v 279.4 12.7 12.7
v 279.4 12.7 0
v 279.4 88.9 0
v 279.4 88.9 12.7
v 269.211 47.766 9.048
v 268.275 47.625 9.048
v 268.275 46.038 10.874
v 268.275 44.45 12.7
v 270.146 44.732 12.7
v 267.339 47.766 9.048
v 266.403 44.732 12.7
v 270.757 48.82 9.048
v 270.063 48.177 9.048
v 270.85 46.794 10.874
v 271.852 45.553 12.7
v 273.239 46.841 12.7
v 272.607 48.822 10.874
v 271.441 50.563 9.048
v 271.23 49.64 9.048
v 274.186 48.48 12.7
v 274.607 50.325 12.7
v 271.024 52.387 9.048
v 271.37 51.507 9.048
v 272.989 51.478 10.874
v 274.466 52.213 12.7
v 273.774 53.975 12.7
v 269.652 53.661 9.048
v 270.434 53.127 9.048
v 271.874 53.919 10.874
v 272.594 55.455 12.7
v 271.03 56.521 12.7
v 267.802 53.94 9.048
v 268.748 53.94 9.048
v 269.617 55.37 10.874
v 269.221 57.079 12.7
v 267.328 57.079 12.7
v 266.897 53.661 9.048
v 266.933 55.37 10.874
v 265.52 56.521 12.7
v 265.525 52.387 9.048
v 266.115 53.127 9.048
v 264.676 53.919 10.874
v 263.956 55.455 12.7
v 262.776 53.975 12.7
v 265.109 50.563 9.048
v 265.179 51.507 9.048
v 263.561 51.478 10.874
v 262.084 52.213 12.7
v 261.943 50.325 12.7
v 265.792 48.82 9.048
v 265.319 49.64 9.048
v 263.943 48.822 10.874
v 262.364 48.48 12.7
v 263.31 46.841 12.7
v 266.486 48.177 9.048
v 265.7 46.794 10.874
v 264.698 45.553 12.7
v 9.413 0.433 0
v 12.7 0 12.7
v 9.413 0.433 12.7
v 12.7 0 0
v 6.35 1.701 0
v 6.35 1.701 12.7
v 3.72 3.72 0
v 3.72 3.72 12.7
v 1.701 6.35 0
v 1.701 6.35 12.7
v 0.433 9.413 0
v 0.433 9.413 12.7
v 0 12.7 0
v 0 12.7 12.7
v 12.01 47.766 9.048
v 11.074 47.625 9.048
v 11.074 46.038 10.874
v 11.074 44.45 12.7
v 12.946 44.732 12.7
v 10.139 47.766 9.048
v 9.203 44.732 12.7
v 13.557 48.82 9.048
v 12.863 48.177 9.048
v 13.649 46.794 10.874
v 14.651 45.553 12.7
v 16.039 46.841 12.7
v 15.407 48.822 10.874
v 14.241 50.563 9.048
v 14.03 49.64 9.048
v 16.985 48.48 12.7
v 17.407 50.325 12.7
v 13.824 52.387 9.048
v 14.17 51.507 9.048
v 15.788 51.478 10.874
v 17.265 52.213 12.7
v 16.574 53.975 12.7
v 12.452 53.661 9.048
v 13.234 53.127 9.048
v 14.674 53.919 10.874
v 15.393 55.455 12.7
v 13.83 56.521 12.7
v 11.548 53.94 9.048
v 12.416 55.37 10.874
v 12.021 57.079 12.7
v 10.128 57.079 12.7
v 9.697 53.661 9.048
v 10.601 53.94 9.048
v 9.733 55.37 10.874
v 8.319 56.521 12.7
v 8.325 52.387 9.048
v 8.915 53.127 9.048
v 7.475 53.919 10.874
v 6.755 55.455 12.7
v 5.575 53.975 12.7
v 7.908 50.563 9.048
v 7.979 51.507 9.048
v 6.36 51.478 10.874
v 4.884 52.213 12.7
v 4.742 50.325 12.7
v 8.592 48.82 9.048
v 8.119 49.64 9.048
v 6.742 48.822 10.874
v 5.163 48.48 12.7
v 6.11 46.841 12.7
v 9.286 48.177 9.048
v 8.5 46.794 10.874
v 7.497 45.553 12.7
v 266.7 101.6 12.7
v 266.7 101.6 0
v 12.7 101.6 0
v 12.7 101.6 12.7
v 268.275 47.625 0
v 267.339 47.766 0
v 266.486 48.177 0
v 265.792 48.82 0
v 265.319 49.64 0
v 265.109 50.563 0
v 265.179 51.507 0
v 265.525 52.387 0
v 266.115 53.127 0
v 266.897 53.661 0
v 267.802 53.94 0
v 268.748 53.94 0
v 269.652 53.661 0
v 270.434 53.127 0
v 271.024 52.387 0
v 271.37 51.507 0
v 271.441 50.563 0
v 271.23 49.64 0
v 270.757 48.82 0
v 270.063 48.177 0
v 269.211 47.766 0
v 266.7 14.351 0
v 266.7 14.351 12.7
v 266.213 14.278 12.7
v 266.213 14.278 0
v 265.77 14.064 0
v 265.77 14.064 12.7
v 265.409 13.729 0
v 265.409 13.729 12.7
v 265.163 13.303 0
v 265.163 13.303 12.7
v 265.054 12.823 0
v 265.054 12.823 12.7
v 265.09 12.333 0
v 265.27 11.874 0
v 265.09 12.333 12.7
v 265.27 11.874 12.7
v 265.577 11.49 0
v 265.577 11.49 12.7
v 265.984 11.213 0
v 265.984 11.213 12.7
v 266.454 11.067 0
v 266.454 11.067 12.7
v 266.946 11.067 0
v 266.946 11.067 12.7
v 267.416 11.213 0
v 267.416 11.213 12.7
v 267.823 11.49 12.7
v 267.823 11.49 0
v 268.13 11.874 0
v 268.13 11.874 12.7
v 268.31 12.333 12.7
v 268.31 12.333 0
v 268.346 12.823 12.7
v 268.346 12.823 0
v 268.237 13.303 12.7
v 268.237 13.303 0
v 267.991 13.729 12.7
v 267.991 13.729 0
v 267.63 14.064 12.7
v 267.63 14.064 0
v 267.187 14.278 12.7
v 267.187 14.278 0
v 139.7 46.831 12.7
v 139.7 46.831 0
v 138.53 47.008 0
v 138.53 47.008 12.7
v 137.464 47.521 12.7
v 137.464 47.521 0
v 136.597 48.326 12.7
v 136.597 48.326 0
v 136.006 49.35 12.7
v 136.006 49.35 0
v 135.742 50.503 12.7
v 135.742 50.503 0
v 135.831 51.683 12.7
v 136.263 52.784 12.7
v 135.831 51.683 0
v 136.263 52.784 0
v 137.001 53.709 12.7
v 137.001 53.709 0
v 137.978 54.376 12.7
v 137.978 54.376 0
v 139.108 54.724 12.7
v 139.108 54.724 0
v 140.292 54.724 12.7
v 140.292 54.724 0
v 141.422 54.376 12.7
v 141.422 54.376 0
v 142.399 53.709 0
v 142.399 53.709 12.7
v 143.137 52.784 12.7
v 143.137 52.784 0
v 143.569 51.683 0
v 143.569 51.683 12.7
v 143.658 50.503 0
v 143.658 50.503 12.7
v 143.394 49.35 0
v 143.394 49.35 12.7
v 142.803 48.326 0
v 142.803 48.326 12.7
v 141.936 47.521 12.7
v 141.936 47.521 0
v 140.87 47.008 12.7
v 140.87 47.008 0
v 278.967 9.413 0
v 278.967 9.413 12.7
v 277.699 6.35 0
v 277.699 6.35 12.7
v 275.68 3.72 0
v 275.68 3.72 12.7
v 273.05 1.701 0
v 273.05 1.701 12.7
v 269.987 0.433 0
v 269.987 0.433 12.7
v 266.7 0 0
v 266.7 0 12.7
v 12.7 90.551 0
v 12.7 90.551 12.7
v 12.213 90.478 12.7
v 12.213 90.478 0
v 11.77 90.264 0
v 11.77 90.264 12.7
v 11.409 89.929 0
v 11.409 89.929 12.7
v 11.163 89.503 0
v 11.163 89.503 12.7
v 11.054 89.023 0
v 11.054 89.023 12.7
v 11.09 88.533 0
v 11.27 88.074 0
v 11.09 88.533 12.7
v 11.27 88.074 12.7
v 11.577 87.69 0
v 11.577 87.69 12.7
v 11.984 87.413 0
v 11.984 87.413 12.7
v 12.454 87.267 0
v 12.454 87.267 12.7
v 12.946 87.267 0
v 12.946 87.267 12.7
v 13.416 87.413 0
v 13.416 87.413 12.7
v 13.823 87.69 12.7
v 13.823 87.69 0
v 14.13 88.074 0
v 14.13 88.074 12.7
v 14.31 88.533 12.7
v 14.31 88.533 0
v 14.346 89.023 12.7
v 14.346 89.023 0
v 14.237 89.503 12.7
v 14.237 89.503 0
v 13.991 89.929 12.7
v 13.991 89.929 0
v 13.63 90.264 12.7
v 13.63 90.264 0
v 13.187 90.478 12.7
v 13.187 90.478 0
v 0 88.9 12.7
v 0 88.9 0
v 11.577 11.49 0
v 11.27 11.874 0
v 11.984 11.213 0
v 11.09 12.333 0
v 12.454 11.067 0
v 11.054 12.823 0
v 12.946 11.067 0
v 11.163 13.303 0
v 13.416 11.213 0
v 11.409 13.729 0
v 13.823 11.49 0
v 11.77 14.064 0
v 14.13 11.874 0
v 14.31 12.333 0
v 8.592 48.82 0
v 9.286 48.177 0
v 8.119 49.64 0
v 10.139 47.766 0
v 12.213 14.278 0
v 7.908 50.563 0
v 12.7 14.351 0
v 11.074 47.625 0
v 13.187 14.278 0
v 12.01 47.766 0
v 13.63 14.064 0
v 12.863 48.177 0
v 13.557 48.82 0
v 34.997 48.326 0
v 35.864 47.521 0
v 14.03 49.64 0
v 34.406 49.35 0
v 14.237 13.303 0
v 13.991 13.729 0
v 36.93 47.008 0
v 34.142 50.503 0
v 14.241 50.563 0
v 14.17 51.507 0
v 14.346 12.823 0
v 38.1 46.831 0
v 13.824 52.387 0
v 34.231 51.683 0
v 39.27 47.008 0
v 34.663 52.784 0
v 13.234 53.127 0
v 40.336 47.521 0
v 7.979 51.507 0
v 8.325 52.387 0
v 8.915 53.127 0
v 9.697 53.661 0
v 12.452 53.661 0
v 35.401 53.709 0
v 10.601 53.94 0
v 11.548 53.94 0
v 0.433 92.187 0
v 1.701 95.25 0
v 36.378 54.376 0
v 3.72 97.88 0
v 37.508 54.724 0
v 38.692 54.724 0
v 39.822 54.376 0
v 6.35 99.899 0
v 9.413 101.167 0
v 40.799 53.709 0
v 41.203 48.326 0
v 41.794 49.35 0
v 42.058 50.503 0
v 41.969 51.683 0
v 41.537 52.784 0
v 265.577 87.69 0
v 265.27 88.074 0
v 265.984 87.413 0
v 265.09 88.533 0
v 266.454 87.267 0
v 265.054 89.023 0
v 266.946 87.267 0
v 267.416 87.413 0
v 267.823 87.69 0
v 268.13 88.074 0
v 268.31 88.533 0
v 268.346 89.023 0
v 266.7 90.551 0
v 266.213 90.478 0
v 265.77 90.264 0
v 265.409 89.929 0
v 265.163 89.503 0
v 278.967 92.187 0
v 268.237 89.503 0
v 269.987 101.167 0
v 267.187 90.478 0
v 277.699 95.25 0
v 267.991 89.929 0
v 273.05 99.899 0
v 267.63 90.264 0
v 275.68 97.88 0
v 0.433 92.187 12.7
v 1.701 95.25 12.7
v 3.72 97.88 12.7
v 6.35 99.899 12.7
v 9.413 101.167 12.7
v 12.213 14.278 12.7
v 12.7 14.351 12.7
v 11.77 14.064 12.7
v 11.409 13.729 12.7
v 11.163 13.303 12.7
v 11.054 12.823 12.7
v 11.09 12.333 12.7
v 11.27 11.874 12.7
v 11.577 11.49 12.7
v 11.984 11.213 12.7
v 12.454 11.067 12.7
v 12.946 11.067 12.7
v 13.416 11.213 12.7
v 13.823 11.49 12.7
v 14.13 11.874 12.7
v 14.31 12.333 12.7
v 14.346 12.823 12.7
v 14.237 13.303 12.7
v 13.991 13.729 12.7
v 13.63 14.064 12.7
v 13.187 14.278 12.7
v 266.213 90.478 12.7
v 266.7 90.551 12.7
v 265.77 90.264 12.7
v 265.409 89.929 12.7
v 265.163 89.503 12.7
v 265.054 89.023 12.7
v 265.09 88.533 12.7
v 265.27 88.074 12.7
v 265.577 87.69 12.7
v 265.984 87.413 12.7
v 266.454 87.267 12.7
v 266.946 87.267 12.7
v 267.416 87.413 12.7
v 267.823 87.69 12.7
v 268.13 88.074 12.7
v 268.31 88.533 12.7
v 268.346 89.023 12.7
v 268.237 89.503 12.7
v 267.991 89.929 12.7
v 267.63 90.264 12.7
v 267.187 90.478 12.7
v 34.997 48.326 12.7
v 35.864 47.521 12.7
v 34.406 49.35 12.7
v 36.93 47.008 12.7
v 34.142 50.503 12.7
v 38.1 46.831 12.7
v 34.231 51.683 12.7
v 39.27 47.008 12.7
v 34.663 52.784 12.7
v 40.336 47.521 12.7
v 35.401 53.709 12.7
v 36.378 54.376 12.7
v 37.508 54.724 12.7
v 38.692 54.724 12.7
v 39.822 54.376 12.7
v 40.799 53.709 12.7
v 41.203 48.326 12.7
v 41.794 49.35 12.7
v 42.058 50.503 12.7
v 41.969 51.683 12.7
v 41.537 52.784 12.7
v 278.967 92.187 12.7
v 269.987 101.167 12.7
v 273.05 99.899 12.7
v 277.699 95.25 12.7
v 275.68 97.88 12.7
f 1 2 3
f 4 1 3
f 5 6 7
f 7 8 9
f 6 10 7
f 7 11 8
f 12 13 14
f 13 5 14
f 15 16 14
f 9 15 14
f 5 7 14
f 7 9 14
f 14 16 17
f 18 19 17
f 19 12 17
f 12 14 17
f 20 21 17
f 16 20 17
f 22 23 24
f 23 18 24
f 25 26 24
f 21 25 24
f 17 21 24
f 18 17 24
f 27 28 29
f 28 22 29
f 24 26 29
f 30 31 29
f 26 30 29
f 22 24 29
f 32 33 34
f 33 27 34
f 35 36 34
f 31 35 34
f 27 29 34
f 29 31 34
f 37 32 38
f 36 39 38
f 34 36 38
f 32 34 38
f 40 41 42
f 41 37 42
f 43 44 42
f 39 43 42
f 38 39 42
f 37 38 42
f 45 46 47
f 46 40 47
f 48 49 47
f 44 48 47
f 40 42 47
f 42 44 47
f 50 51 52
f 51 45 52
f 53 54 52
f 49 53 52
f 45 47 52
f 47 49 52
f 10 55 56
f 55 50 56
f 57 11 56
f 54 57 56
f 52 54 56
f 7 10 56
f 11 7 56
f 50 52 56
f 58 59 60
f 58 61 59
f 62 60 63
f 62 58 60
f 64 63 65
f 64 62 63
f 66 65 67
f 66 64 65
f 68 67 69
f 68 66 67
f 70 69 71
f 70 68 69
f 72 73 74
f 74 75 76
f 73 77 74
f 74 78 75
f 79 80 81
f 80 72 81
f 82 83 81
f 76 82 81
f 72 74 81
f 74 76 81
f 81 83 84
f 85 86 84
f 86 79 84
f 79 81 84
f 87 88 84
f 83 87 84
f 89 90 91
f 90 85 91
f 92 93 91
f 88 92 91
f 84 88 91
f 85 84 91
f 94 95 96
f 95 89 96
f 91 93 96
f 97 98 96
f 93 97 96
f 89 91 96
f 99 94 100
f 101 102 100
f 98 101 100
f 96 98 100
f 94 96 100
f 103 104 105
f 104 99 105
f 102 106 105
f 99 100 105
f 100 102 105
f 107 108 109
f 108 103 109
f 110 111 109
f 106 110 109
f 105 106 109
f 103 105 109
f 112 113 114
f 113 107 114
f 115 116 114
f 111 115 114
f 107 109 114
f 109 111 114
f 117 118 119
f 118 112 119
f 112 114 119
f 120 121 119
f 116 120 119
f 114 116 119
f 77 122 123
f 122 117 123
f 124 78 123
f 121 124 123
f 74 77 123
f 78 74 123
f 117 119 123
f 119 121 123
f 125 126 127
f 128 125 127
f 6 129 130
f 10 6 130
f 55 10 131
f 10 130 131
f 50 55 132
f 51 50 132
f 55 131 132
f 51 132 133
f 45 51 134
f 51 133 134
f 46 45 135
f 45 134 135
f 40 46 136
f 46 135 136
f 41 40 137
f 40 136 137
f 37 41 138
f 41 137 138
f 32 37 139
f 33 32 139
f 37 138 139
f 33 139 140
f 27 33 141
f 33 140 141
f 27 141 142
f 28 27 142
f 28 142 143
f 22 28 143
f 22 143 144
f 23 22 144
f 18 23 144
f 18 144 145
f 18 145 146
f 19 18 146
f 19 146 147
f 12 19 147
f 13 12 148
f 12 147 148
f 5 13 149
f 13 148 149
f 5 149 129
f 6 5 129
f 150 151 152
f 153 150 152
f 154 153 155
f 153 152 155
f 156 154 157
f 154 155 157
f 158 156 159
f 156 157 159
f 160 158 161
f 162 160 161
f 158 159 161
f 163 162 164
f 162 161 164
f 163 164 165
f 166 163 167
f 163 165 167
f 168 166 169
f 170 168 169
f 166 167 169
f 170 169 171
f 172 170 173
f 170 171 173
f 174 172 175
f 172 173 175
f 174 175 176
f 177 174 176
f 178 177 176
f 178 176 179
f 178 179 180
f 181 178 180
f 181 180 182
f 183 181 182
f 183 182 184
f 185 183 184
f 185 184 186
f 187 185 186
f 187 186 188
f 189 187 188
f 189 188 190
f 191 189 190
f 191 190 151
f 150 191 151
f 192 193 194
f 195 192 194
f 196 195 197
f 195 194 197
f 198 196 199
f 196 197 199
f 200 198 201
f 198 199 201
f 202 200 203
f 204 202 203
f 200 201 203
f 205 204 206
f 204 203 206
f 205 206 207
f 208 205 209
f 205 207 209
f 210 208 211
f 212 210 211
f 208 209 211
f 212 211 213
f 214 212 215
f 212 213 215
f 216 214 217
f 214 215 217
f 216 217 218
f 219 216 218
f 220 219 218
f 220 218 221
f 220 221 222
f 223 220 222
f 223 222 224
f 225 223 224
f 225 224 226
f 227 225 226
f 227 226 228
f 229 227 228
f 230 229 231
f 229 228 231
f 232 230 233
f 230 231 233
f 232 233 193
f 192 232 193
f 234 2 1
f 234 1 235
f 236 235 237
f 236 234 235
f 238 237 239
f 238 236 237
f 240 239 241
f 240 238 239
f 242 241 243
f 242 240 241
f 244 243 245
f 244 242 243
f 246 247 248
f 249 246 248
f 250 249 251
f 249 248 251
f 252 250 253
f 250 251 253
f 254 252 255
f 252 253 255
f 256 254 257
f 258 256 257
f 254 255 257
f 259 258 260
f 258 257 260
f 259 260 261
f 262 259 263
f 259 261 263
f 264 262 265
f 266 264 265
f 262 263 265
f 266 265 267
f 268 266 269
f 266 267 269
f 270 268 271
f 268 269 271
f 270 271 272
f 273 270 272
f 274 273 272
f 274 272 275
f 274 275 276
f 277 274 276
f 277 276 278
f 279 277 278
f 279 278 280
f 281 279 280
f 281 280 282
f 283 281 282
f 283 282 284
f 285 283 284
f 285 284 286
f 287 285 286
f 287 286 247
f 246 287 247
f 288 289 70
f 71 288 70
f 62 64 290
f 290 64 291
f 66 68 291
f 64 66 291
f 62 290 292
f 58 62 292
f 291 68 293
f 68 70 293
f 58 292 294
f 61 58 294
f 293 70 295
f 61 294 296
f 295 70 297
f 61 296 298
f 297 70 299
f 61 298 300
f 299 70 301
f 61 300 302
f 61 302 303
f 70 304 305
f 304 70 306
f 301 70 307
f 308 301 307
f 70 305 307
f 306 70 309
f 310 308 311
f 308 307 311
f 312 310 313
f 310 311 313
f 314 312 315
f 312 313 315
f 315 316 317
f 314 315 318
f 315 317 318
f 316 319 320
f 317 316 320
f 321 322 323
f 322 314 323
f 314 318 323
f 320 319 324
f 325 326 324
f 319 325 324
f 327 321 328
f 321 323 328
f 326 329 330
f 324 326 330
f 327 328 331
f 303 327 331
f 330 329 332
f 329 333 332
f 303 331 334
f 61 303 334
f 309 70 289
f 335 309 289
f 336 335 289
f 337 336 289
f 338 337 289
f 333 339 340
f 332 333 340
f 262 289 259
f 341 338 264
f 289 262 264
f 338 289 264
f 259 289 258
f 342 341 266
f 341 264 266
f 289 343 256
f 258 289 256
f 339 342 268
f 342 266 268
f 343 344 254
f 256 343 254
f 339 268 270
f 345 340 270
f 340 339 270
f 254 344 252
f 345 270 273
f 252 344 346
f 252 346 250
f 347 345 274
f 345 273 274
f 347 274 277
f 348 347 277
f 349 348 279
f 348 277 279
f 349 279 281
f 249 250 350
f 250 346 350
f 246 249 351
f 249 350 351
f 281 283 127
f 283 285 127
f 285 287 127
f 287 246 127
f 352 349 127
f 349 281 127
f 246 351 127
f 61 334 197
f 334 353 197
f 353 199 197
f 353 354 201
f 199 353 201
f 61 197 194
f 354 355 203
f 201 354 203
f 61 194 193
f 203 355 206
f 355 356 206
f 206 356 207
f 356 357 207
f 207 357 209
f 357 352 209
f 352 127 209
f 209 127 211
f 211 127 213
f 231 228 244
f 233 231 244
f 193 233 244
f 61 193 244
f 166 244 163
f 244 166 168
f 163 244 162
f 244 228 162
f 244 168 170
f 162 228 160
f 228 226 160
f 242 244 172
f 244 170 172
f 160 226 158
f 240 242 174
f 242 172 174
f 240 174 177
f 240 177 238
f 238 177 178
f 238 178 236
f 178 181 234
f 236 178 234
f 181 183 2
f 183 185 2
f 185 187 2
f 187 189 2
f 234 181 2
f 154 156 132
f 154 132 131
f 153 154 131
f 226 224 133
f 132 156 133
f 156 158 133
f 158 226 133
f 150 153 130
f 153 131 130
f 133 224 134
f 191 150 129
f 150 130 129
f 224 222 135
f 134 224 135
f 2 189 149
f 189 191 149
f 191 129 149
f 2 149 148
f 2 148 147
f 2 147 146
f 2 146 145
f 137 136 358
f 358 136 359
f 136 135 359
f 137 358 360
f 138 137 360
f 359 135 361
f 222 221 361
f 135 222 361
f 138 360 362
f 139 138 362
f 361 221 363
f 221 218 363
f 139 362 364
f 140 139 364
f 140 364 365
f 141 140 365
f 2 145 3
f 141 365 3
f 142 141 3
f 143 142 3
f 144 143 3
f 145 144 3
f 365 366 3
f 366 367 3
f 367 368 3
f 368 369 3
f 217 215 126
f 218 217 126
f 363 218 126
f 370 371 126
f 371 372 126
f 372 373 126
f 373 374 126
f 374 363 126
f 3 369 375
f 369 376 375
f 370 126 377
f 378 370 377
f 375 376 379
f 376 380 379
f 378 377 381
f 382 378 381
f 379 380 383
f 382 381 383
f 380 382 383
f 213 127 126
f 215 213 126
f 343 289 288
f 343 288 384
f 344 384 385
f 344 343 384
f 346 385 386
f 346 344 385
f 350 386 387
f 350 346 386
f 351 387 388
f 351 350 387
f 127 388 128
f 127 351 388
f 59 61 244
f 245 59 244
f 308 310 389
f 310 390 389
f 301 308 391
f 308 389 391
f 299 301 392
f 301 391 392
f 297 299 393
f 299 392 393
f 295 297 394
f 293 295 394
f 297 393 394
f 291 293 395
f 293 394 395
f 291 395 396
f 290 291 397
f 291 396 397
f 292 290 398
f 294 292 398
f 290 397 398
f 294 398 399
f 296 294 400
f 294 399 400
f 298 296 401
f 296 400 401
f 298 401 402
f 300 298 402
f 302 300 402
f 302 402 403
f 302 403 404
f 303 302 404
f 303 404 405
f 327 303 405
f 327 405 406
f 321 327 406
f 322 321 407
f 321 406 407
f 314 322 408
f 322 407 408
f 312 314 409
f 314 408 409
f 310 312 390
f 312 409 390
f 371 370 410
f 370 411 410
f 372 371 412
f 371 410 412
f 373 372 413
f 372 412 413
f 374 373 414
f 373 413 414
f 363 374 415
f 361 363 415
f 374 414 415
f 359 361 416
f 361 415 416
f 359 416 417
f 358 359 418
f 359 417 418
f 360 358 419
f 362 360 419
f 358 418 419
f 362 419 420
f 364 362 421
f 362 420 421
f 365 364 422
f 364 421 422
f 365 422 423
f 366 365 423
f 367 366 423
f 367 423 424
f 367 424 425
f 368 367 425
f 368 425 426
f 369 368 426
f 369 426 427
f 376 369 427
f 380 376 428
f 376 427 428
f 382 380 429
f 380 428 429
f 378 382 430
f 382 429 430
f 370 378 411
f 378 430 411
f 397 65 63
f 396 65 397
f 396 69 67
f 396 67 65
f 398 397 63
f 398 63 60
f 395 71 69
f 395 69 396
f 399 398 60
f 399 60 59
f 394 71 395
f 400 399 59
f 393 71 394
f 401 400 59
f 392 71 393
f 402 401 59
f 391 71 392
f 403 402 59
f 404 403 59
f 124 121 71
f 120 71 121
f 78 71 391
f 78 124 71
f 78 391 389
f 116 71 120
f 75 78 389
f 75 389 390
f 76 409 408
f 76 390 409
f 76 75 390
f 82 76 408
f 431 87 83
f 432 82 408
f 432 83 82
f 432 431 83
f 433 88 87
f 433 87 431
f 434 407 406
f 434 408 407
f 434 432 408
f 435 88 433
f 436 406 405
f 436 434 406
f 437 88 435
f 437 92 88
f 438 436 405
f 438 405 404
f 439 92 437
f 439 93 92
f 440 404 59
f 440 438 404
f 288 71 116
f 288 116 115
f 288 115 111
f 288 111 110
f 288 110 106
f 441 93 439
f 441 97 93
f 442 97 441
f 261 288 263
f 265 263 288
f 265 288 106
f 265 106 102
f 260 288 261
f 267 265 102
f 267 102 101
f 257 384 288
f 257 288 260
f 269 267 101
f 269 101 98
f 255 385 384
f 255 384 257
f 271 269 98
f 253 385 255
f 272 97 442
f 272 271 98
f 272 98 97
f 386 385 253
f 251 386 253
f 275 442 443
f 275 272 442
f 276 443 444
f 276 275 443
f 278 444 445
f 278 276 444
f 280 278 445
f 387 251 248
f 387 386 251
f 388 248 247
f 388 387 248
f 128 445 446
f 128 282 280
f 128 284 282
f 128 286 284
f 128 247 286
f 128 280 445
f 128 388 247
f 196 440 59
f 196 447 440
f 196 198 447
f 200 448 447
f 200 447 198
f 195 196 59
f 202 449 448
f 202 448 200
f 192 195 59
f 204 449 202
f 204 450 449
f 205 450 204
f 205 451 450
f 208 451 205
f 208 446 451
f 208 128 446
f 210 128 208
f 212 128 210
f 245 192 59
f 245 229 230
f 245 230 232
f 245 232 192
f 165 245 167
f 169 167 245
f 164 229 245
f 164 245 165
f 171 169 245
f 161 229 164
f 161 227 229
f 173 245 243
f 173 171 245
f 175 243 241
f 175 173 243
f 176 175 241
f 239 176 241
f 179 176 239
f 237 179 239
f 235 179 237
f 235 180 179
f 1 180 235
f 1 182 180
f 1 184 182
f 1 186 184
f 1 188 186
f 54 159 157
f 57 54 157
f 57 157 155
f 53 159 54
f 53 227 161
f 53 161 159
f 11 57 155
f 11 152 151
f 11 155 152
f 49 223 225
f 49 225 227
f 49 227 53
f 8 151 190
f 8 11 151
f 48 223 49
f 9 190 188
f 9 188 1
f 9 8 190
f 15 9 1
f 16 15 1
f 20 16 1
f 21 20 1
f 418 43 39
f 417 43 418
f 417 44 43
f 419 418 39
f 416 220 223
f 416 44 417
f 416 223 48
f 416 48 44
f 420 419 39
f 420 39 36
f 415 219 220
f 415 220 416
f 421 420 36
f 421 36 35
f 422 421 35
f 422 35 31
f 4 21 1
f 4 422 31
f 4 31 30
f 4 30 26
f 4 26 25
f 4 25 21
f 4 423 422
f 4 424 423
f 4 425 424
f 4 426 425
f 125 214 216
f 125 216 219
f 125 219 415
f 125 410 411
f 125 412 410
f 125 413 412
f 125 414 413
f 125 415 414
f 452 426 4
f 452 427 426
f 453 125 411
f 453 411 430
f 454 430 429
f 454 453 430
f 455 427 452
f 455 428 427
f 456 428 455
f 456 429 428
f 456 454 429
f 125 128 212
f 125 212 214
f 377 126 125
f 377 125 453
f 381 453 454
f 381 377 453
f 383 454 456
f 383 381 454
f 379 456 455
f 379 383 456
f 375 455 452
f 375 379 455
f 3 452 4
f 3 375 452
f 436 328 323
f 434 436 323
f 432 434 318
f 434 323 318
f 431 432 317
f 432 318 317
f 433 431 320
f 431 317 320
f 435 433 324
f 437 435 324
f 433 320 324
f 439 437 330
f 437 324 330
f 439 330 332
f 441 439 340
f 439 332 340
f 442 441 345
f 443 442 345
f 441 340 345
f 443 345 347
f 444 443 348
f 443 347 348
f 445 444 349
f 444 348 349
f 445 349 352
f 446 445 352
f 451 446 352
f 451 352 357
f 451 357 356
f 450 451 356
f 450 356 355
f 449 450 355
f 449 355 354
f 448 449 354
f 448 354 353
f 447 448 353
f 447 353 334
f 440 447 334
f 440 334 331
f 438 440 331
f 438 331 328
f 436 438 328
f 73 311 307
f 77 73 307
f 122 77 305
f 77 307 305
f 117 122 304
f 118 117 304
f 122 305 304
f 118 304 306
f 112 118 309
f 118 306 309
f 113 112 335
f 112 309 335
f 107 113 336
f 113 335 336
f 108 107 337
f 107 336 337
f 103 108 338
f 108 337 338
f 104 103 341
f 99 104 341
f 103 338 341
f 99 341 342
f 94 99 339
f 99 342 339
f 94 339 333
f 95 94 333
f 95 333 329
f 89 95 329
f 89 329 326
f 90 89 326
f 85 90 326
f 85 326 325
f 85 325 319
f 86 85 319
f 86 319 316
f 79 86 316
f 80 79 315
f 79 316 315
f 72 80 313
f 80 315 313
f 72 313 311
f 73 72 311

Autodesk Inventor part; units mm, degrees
ref_plane "YZ Plane" through (0, 0, 0) normal (1, 0, 0) x (0, 1, 0)
ref_plane "XZ Plane" through (0, 0, 0) normal (0, 1, 0) x (-1, 0, 0)
ref_plane "XY Plane" through (0, 0, 0) normal (0, 0, 1) x (1, 0, 0)
sketch "Sketch1" plane through (0, 0, 0) normal (0, 0, 1) x (1, 0, 0)
  line L0 (12.7, 0) -> (266.7, 0)
  line L1 (279.4, 12.7) -> (279.4, 88.9)
  line L2 (266.7, 101.6) -> (12.7, 101.6)
  line L3 (0, 88.9) -> (0, 12.7)
  arc A0 (3.175, 101.6) -> (0, 98.425) centre (3.175, 98.425) ccw
  arc A1 (266.7, 0) -> (279.4, 12.7) centre (266.7, 12.7) ccw
  arc A2 (12.7, 101.6) -> (0, 88.9) centre (12.7, 88.9) ccw
  arc A3 (0, 12.7) -> (12.7, 0) centre (12.7, 12.7) ccw
  arc A4 (279.4, 88.9) -> (266.7, 101.6) centre (266.7, 88.9) ccw
  point P0 (0, 0)
  point P1 (279.4, 101.6)
  point P2 (279.4, 0)
  point P3 (0, 101.6)
  dimension "d0" = 279.4
  dimension "d1" = 101.6
  dimension "d2" = 3.175
  dimension "d3" = 12.7
  dimension "d28" = 12.7
extrude "Extrusion1" add sketch "Sketch1" along normal blind 12.7
sketch "Sketch2" plane through (0, 0, 12.7) normal (0, 0, 1) x (1, 0, 0)
  point P0 (0, 0)
sketch "Sketch3" plane through (0, 0, 12.7) normal (0, 0, 1) x (1, 0, 0)
  line L0 (0, 88.9) -> (0, 12.7) projected
  line L1 (279.4, 12.7) -> (279.4, 88.9) projected
  line L2 (266.7, 101.6) -> (12.7, 101.6) projected
  point P0 (0, 0)
  point P1 (11.0744, 50.8)
  point P2 (38.1, 50.8)
  point P3 (268.2748, 50.8)
  point P4 (139.7, 50.8)
  point P5 (279.4, 101.6)
  dimension "d6" = 11.0744
  dimension "d7" = 38.1
  dimension "d8" = 139.7
  dimension "d9" = 11.1252
  dimension "d10" = 50.8
  dimension "d11" = 50.8
  dimension "d12" = 50.8
  dimension "d13" = 50.8
hole "Hole1" at (11.0744, 50.8, 12.7) at (268.2748, 50.8, 12.7) direction (0, 0, -1) diameter 6.35 end through all countersink diameter 12.7 countersink angle 82
hole "Hole2" at (38.1, 50.8, 12.7) at (139.7, 50.8, 12.7) direction (0, 0, -1) diameter 7.9375 end through all
sketch "Sketch4" plane through (0, 0, 12.7) normal (0, 0, 1) x (1, 0, 0)
  point P0 (0, 0)
sketch "Sketch5" plane through (0, 0, 0) normal (0, 0, -1) x (-1, 0, 0)
  point P0 (0, 0)
hole "Hole3" at (266.7, 88.9, 0) at (266.7, 12.7, 0) at (12.7, 12.7, 0) at (12.7, 88.9, 0) direction (0, 0, 1) diameter 3.302 end through all thread size "8-32 UNC" class "2B" standard "ANSI Unified Screw Threads"
properties part number "AW5.5aBasePlate"
